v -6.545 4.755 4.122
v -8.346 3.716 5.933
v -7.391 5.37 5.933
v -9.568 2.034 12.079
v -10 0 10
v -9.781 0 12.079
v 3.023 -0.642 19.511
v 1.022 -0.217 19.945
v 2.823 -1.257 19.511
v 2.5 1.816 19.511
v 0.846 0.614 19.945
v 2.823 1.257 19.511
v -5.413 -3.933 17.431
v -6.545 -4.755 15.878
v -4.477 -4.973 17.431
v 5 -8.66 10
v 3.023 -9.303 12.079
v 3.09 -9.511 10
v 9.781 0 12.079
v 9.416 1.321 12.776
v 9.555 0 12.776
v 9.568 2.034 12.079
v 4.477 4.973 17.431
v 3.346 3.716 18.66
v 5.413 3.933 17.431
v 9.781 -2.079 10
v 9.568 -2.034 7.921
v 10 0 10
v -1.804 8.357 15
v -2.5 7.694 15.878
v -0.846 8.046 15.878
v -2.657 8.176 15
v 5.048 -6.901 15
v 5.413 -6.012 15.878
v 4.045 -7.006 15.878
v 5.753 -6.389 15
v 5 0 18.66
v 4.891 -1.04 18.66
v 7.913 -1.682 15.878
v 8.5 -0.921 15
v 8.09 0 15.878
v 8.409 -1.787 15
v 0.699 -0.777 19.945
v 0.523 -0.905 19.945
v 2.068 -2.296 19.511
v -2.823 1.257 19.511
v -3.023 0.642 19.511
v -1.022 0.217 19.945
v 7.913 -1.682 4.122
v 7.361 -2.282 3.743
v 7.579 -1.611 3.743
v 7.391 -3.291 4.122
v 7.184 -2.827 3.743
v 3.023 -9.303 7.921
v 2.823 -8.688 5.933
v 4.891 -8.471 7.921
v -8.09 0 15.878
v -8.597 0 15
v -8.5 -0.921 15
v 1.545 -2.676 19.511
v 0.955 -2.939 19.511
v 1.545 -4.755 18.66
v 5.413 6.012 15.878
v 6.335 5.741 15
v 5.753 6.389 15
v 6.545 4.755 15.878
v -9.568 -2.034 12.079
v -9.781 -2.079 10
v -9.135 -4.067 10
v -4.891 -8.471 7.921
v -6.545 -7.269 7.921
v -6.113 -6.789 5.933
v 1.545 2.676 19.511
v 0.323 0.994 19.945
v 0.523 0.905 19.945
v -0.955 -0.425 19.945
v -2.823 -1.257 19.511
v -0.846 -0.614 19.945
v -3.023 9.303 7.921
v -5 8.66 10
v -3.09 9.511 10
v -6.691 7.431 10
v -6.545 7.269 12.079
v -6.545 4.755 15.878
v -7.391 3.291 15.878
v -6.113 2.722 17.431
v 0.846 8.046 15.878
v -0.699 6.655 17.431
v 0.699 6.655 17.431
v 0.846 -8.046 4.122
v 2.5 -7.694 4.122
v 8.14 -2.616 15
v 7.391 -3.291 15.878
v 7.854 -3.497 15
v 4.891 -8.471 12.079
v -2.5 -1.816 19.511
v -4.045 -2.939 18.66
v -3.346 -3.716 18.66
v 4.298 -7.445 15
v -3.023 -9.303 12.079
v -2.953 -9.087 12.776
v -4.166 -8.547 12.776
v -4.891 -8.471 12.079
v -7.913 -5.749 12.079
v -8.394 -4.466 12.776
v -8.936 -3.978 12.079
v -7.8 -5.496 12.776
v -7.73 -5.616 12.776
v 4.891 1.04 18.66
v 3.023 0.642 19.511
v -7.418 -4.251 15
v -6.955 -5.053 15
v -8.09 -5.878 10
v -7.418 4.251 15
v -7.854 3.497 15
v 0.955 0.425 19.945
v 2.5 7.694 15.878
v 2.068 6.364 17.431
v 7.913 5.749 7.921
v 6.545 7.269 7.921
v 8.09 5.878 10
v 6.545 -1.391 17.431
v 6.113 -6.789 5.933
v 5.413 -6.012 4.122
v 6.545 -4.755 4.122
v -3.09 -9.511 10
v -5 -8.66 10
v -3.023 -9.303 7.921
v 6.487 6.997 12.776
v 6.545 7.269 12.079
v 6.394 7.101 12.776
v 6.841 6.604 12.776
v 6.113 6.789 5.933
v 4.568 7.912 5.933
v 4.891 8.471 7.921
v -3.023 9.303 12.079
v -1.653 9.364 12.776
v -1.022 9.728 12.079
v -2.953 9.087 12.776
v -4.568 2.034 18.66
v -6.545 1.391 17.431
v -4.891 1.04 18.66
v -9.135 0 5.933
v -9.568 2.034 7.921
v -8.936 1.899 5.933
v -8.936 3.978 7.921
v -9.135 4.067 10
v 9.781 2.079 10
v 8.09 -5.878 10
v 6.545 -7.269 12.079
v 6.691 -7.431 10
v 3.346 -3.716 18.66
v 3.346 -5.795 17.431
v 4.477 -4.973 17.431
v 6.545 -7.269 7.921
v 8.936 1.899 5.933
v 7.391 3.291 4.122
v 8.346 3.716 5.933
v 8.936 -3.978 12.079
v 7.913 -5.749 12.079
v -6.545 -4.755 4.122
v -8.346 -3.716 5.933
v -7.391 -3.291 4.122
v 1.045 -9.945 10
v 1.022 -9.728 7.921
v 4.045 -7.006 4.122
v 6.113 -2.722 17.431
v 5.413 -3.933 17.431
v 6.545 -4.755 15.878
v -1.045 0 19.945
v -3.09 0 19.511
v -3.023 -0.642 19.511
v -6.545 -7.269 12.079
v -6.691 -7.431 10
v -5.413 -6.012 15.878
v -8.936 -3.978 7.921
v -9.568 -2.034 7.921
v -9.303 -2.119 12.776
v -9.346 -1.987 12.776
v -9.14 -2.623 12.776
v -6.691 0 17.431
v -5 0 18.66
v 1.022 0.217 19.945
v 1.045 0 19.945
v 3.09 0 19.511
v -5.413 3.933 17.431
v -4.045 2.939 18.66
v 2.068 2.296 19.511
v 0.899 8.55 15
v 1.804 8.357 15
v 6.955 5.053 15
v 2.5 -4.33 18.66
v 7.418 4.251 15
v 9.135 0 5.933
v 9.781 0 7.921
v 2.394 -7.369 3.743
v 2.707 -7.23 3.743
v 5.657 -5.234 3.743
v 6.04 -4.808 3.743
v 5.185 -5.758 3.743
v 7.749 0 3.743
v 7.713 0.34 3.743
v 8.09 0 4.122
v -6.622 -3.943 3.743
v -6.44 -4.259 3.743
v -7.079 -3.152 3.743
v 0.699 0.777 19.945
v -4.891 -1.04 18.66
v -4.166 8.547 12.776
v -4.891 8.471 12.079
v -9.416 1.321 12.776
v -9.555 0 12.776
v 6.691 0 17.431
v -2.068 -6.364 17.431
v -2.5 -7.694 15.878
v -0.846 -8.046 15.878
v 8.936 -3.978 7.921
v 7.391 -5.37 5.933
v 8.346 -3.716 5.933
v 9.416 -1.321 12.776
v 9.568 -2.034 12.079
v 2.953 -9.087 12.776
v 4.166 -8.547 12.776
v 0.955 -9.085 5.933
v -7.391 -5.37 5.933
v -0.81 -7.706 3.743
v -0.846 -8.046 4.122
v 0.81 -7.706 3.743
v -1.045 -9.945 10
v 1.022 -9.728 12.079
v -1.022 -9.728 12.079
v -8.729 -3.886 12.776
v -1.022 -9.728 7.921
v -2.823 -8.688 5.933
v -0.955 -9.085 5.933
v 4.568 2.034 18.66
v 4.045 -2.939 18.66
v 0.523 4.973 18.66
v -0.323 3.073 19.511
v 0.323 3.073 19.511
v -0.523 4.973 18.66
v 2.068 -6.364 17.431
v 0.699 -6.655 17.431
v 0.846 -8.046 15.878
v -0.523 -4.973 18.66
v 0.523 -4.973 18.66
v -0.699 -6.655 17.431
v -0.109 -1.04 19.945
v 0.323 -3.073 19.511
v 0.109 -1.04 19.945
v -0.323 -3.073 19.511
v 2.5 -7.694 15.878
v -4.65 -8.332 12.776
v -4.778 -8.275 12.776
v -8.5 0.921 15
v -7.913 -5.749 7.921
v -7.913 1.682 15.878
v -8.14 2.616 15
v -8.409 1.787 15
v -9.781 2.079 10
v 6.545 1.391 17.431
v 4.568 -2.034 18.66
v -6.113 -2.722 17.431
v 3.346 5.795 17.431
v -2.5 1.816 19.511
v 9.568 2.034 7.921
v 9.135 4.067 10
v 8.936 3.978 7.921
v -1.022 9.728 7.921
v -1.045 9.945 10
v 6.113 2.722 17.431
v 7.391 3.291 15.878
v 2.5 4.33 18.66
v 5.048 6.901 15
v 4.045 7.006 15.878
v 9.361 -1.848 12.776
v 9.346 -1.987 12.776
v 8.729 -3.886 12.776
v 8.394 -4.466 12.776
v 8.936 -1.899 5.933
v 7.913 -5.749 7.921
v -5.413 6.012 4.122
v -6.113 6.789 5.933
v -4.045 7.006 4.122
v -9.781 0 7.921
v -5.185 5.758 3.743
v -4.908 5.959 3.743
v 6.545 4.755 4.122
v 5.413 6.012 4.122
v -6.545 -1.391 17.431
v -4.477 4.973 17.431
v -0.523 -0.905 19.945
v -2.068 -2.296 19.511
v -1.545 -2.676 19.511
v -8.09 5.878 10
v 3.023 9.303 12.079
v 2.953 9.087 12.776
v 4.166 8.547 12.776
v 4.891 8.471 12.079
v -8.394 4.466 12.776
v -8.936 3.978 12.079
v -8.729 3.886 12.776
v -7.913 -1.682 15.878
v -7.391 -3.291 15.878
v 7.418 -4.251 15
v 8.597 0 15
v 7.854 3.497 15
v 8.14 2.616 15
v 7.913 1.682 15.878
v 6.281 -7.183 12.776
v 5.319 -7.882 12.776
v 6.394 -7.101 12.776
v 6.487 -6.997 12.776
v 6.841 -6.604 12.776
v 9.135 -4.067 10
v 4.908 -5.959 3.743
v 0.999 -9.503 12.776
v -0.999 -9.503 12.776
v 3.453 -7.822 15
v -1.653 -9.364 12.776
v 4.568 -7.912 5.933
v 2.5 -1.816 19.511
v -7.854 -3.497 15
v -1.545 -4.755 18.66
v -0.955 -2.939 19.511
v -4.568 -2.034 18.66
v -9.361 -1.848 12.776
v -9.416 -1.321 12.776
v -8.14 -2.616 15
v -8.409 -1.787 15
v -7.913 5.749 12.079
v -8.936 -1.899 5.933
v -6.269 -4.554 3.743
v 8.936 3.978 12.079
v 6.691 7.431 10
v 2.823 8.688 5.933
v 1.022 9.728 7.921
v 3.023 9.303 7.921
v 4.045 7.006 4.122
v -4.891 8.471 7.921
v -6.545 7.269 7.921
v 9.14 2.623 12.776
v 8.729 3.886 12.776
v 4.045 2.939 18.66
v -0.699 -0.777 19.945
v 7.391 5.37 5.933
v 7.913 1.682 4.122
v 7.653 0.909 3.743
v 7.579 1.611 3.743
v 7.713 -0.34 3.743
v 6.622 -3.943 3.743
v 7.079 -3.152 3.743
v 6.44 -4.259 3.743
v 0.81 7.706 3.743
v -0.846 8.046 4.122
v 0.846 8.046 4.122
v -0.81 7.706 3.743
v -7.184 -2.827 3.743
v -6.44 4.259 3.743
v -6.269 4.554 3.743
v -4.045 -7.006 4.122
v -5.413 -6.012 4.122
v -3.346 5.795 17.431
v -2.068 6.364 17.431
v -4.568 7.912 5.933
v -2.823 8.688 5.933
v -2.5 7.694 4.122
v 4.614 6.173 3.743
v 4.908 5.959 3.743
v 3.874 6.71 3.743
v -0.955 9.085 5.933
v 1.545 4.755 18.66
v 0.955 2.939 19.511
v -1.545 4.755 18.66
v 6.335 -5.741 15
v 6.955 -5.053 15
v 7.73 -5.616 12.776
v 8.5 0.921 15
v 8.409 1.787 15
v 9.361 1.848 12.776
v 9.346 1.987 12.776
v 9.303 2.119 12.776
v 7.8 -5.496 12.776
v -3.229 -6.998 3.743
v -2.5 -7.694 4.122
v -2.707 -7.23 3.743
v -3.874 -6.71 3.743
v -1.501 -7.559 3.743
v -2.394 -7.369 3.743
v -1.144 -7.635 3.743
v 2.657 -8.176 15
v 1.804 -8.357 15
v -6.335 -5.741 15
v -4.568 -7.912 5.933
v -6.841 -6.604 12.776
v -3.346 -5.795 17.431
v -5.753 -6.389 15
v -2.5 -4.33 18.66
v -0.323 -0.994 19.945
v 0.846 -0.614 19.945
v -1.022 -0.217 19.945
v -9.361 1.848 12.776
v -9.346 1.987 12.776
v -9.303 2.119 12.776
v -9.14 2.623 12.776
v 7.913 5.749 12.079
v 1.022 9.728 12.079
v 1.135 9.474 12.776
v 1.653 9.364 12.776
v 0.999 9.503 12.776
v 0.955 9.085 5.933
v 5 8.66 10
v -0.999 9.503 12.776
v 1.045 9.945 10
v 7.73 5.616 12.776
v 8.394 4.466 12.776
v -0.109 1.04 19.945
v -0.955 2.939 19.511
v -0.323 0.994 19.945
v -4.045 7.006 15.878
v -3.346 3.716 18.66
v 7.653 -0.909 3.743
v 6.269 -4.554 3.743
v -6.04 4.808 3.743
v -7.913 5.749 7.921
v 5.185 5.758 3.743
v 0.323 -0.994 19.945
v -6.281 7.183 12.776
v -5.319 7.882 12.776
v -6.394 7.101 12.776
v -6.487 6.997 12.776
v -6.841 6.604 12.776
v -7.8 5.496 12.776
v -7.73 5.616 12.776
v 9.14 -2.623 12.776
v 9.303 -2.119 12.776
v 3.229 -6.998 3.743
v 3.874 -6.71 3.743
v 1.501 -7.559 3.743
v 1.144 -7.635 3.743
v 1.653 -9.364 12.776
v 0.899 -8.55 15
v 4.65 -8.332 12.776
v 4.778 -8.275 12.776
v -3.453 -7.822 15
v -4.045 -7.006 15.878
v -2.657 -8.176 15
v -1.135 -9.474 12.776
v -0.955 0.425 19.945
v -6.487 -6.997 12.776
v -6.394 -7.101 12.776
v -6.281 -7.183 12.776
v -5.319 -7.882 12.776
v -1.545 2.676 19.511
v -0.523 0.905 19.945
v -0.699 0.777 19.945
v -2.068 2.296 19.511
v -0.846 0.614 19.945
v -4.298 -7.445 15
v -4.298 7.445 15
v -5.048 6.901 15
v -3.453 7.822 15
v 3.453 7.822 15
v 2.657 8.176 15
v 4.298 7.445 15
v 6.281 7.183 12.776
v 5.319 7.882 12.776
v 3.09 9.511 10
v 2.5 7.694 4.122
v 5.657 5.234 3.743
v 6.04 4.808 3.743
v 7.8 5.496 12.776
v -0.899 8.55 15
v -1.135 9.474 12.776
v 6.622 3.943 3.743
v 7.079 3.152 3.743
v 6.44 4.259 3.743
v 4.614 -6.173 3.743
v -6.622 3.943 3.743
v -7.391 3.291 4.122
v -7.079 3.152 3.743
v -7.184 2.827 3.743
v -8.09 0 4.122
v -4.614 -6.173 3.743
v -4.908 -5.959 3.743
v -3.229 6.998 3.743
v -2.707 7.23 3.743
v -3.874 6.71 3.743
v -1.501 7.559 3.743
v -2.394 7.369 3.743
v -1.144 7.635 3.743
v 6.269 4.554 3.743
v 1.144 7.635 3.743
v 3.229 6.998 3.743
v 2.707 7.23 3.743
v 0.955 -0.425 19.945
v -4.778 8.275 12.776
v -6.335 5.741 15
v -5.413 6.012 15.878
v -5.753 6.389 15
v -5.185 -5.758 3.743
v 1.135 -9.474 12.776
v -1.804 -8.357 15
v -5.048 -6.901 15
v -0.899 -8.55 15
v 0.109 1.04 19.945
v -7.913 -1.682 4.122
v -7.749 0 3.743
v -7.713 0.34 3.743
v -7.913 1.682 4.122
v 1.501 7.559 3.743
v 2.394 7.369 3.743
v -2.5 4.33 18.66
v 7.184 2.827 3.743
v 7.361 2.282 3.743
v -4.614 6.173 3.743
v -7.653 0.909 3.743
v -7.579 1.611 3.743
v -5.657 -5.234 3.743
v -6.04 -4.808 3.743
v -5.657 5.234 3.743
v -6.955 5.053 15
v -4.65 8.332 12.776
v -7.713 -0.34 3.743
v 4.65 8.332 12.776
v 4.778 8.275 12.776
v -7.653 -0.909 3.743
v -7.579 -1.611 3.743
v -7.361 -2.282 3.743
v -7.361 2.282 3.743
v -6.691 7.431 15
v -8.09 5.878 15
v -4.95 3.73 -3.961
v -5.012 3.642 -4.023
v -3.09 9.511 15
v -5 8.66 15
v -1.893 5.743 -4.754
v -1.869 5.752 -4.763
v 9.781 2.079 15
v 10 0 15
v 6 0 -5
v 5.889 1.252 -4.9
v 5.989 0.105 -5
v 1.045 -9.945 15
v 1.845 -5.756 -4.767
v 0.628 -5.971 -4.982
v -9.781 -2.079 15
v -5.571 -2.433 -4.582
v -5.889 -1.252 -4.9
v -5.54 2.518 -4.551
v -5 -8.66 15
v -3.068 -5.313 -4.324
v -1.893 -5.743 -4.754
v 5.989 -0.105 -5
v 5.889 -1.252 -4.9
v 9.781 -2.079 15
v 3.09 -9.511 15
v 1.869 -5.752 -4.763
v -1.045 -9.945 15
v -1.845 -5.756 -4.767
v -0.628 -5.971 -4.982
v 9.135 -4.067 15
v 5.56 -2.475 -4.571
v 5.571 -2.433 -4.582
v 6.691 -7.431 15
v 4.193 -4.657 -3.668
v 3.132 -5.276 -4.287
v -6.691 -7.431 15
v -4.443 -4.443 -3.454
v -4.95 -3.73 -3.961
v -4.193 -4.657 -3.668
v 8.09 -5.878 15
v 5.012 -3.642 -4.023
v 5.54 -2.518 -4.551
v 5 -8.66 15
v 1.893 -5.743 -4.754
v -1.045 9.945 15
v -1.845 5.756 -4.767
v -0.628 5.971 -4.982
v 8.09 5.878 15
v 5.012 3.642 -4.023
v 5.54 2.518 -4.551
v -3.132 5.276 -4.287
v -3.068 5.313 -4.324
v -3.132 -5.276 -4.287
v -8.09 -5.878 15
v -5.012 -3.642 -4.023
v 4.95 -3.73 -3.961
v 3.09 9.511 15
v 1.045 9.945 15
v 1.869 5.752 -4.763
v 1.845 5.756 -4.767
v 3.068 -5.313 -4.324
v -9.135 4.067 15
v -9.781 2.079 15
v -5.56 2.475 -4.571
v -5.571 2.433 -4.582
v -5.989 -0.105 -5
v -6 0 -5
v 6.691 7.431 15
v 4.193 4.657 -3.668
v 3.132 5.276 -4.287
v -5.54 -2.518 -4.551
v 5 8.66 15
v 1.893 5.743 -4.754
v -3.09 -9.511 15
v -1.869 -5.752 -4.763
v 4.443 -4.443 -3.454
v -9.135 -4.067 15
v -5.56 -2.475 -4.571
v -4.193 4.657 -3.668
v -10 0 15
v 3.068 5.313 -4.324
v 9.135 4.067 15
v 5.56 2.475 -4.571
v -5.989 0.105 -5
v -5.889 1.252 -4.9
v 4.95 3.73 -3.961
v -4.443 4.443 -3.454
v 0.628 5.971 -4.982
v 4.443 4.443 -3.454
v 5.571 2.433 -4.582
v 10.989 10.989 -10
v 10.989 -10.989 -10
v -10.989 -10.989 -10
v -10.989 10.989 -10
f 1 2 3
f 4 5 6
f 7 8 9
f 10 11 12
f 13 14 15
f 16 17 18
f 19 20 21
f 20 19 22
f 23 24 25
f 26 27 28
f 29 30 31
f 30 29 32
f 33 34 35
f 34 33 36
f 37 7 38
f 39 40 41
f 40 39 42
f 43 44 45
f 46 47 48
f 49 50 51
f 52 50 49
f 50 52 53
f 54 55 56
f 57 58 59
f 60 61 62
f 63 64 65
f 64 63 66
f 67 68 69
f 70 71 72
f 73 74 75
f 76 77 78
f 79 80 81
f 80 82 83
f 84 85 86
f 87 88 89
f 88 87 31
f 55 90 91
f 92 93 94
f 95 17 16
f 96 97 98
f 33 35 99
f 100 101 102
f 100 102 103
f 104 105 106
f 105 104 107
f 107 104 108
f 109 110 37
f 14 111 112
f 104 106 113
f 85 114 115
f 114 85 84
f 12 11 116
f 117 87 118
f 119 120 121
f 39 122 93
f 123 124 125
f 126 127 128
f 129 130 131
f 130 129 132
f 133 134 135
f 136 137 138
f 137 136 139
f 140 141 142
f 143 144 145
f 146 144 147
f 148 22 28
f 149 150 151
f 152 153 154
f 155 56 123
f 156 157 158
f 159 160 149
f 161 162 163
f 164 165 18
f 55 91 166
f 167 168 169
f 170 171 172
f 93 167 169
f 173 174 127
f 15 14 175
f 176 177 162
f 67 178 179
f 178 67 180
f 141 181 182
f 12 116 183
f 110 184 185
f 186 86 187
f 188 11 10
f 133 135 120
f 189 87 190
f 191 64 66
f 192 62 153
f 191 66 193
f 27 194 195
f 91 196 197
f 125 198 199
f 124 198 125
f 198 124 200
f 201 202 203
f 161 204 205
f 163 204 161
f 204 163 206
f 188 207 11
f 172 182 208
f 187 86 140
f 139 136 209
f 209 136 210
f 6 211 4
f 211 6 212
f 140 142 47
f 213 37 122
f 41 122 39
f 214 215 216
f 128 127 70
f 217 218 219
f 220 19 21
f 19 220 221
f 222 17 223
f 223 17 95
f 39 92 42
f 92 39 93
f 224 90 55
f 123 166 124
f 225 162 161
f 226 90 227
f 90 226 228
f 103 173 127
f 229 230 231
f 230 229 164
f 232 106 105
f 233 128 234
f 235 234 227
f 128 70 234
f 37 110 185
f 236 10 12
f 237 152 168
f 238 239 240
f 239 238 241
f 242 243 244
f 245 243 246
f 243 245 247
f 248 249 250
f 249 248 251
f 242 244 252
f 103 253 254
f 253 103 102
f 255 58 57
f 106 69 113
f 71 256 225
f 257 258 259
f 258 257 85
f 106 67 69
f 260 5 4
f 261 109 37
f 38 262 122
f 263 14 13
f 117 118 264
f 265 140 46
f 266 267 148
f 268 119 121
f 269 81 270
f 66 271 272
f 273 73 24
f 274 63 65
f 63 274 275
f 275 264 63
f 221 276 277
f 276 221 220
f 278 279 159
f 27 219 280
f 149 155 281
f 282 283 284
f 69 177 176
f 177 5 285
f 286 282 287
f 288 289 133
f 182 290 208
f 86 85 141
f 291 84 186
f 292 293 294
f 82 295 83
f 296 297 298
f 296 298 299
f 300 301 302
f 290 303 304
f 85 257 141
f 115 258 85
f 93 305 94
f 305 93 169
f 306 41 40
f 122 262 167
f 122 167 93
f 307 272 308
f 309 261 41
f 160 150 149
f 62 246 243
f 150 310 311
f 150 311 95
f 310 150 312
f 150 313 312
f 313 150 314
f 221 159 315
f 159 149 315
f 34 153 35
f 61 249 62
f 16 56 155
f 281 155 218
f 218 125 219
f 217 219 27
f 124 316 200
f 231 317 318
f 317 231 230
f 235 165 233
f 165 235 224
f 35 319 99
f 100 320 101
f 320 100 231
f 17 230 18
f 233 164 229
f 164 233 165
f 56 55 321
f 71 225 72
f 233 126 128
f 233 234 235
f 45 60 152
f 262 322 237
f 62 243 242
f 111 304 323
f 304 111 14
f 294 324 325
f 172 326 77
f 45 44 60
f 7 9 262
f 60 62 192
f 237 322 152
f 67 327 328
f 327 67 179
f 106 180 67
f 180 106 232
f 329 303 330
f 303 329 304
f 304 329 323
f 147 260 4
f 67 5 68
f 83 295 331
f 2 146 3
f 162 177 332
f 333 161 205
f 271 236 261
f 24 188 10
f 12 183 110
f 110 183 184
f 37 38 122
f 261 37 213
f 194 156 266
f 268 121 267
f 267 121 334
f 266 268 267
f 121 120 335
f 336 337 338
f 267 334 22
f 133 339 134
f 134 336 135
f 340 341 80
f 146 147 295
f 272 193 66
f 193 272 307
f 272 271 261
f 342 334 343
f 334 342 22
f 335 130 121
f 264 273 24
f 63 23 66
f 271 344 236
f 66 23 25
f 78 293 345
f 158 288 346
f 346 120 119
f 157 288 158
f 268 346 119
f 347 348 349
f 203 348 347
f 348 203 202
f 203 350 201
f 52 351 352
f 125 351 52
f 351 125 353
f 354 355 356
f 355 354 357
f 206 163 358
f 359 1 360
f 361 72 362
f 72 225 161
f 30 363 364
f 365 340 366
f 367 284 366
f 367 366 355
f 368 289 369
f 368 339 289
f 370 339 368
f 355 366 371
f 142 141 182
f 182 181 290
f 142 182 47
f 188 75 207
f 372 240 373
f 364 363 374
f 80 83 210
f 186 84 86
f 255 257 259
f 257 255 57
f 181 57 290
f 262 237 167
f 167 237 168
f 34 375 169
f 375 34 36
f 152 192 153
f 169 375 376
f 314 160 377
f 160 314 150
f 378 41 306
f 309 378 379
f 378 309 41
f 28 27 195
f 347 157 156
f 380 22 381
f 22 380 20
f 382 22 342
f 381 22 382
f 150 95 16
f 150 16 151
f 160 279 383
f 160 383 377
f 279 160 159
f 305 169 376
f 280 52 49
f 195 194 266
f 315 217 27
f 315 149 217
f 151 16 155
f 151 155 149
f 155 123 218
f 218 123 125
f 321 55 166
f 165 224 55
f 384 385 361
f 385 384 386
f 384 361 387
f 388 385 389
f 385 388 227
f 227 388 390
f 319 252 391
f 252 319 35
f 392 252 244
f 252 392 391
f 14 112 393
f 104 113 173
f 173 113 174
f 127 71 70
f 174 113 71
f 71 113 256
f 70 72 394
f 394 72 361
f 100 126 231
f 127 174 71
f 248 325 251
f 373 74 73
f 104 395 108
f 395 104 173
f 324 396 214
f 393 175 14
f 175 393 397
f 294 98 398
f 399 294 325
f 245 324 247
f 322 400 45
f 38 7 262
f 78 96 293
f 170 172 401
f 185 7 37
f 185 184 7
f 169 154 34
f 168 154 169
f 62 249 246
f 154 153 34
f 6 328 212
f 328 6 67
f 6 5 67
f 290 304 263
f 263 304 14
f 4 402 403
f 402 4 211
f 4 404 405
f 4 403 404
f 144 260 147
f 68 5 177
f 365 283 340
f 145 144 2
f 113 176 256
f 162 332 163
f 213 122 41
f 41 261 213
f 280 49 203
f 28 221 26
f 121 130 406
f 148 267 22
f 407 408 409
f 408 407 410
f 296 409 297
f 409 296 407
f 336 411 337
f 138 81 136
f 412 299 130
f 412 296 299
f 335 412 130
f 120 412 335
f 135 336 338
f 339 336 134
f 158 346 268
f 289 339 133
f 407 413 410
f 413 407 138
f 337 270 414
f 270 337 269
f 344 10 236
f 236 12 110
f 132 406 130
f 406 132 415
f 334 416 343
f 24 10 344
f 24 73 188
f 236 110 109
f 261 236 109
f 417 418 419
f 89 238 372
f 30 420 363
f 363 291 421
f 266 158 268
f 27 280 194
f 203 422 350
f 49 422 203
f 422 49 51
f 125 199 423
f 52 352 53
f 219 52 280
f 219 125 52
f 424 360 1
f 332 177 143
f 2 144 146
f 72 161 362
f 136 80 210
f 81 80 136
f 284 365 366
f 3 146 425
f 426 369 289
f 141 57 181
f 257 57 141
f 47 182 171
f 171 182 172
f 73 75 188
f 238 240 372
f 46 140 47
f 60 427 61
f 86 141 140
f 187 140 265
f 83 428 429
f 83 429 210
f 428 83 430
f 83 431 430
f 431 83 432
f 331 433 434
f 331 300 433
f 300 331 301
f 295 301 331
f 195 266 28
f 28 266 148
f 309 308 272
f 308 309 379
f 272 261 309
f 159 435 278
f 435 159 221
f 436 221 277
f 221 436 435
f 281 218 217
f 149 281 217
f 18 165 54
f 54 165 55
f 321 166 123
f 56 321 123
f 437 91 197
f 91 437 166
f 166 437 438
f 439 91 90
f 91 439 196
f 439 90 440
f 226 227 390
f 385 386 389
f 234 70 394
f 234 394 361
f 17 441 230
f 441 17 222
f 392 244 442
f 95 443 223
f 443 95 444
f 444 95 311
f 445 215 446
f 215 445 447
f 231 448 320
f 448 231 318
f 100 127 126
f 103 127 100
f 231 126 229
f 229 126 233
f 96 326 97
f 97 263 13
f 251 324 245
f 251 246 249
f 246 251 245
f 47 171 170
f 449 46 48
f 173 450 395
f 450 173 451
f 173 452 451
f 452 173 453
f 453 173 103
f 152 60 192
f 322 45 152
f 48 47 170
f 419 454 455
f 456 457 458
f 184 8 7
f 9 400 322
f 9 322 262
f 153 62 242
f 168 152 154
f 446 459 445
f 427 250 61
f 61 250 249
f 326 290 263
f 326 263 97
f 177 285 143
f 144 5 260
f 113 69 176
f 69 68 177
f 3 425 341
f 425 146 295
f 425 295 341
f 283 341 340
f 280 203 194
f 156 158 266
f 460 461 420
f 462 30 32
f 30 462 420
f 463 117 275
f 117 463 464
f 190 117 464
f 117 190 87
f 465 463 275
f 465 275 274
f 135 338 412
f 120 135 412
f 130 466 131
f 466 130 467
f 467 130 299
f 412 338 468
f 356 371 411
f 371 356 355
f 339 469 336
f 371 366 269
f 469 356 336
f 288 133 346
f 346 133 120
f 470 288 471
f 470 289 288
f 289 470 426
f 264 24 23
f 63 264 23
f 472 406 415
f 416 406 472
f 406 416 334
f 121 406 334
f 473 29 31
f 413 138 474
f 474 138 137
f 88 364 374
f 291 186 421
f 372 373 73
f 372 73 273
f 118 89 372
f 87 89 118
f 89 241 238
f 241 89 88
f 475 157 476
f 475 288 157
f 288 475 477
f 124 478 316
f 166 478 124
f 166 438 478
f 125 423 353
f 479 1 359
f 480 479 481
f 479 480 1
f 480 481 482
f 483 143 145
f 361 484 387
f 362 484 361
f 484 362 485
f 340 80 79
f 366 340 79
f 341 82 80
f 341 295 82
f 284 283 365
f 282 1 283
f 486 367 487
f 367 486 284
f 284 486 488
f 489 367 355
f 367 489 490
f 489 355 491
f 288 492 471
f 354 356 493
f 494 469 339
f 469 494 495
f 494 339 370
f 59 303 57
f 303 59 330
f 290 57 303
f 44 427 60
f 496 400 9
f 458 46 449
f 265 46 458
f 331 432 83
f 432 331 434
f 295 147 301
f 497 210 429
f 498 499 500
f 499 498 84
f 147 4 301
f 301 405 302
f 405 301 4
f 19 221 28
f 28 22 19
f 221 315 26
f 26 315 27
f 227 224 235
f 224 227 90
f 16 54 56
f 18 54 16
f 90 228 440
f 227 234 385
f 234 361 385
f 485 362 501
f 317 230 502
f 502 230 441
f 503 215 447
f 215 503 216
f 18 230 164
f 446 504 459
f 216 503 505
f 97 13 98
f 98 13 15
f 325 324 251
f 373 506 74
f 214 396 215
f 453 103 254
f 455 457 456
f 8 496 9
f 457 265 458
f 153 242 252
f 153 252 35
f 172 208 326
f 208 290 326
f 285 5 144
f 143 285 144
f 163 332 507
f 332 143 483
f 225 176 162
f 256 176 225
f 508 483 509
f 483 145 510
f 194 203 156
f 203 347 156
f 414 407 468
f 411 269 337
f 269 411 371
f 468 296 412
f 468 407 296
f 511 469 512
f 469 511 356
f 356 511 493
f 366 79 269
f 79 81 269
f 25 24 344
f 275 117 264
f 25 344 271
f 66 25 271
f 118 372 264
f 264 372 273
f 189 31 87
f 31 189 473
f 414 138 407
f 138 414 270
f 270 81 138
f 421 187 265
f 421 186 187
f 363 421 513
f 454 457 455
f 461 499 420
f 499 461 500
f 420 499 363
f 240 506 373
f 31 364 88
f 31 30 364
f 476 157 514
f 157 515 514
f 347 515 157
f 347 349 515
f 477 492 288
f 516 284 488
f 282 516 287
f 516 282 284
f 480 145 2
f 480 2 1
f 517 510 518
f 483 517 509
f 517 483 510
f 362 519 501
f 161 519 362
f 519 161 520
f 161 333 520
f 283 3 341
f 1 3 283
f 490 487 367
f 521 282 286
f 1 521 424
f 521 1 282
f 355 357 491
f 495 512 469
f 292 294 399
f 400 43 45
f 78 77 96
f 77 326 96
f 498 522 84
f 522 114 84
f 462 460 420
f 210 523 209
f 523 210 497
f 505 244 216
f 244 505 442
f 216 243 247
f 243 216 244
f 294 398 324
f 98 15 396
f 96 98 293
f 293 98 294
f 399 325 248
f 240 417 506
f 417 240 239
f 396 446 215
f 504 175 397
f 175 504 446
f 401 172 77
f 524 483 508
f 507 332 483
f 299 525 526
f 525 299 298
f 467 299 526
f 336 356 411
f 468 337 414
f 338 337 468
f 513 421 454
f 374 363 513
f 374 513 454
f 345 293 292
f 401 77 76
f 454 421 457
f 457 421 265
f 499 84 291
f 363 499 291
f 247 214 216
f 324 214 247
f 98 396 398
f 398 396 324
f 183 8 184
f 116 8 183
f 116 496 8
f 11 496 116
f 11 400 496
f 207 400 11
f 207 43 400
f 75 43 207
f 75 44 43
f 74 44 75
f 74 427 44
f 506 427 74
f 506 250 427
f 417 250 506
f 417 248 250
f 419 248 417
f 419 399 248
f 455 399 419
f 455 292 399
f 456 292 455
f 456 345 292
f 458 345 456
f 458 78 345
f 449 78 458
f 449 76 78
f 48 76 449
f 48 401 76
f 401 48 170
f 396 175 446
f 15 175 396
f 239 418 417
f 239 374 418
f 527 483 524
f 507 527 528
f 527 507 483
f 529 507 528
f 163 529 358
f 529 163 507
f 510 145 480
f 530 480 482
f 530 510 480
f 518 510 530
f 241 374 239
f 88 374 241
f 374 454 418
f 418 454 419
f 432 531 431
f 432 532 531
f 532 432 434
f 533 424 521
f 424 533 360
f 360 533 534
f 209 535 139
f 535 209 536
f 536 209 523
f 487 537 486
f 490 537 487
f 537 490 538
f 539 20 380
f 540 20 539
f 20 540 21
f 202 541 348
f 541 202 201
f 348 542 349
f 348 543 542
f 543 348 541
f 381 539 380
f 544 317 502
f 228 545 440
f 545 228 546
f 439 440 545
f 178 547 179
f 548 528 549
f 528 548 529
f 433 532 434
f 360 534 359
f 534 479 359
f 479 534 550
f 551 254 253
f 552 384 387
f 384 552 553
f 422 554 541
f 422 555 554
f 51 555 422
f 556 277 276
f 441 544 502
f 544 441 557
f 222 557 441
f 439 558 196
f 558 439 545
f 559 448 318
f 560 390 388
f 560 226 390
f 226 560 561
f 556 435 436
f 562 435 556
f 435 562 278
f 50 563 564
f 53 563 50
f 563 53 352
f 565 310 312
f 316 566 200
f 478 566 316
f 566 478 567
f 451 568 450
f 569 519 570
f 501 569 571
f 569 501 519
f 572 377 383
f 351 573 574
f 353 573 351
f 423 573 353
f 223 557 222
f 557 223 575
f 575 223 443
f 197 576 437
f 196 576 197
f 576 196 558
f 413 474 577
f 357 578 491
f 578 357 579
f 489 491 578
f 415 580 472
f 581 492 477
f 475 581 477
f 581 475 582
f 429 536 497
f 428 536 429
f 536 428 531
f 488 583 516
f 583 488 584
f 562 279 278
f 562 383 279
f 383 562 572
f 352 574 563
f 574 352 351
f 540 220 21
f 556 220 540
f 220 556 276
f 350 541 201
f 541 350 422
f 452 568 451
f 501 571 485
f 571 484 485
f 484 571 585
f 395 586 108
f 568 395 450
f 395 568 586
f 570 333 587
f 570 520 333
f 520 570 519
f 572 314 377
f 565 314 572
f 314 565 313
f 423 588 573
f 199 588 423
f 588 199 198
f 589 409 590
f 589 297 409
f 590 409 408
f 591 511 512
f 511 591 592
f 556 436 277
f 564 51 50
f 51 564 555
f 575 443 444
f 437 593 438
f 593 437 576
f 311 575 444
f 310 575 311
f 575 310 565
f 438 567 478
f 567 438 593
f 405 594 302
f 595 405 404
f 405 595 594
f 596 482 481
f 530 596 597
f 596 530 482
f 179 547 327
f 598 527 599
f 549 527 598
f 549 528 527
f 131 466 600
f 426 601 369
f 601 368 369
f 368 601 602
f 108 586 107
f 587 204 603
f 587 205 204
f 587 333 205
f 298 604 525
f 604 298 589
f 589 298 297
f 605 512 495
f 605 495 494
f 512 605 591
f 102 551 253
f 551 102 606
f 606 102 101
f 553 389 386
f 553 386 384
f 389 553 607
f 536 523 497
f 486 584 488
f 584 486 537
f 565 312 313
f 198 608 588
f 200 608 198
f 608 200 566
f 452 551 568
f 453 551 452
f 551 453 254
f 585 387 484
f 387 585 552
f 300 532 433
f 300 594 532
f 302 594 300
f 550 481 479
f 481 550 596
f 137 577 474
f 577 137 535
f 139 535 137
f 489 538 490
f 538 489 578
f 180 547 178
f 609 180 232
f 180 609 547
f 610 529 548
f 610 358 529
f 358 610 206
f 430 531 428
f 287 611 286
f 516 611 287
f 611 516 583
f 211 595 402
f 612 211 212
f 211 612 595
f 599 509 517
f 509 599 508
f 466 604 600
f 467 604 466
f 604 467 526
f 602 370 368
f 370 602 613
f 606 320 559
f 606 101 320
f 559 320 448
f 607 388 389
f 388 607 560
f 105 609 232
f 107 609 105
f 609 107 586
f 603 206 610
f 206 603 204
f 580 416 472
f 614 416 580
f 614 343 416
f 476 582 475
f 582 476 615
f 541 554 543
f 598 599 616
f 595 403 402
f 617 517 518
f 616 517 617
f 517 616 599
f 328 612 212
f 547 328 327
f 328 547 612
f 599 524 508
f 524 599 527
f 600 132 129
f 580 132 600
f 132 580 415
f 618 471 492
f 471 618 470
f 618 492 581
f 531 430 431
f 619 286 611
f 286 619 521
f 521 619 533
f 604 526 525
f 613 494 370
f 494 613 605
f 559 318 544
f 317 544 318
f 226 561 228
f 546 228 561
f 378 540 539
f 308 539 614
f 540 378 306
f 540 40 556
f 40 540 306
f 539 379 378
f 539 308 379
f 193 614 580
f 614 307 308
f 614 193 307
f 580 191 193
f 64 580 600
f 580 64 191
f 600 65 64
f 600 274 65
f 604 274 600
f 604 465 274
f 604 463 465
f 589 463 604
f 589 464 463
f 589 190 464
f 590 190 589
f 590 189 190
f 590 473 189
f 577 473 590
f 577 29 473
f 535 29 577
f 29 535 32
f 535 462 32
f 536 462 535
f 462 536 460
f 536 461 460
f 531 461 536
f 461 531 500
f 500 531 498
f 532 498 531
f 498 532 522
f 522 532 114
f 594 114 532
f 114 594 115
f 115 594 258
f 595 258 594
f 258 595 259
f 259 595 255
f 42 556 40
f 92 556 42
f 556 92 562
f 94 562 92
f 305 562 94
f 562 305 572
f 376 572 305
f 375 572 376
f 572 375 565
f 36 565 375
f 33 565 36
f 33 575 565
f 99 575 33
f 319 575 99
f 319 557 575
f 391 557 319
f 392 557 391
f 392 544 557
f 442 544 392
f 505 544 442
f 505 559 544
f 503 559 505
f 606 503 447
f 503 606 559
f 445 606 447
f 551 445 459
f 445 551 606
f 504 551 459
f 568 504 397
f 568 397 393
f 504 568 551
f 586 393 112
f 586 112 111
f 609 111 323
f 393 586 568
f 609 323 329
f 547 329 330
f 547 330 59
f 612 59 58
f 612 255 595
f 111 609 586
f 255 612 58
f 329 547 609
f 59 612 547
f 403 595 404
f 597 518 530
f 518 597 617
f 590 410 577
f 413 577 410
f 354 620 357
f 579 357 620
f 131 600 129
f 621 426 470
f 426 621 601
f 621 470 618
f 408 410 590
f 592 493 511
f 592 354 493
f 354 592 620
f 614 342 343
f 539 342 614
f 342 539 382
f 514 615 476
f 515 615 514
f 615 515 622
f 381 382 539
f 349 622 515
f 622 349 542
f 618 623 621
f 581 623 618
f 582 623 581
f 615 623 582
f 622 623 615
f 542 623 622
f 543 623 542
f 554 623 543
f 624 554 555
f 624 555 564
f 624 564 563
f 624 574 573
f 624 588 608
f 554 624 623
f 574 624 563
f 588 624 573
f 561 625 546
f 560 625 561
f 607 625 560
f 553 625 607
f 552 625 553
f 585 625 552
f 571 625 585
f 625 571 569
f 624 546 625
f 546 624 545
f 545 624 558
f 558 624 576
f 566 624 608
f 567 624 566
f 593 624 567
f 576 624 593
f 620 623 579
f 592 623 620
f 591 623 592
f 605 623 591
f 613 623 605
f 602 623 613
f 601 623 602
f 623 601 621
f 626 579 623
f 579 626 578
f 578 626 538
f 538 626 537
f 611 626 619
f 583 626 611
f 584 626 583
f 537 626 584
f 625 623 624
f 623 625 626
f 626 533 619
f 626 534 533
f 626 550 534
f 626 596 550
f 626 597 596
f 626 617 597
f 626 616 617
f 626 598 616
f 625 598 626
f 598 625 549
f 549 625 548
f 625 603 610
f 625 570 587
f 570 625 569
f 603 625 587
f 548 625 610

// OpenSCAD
////Object I
//cube([2,3,4]);
//difference() {
// 	cube(30, center=true);
// 	sphere(20);
// }
// //translate([0, 0, 30]) {
// //	cylinder(h=40, r=10);
// //}
//cube([2,3,4]);
//translate([3,0,0]) {
//  cube([2,3,4]);
//}
//
//Object II//
//translate([5,0,0]){
//    sphere(5,3,3);
//}
//translate([-3,-3,0]){
//	color([1,0,0]) sphere(5,4,5);
//}
//translate([0,5,0]){
//    color([0,1,0]) sphere(5,3,3);
//}
//translate([0,0,5]){
//    color([0,0,1]) sphere(5,3,3);
//}

// Object III
//square([5,5]);
//linear_extrude(height = 13) square([20,30]);
//linear_extrude(height = 13) square([30,20]);
//linear_extrude(height = 13) square([40,10]);
//rotate_extrude(height = 13) square([20,30]);
//rotate_extrude(height = 5) square([30,50]);

//Object IV
//translate([1,1,-1.3]){
//	sphere(1);
//}
//translate([1,1,2.5]){
//	sphere(1);
//}
//difference() {
//	// original
//	cube (size = [2,2,2]);
//	// object that carves out
//	# translate ([0.5,0.5,-0.5]) {
//	    cube (size = [1,1,3]);	
//	}
//}

//Object V
translate([0,0,5]){
	color([1,0,0])  cylinder(h=20, r1=6,r2=10,center = true);
}
translate([0,0,-10]){
  polyhedron(
  	points=[[10,10,0],[10,-10,0],[-10,-10,0],[-10,10,0], // the four points at base
           [0,0,10]]/0.91,                                 // the apex point 
  	faces=[ [0,1,4],[1,2,4],[2,3,4],[3,0,4],              // each triangle side
              [1,0,3],[2,1,3] ]                         // two triangles for square base
 	);
}
translate([0,0,10]){
 difference(){
	color([0,1,0]) sphere(r=10);
	#translate([-5,-5,-19.5]){
		linear_extrude(height = 5) color([1,0,1]) square(10);
	}
 }
}
